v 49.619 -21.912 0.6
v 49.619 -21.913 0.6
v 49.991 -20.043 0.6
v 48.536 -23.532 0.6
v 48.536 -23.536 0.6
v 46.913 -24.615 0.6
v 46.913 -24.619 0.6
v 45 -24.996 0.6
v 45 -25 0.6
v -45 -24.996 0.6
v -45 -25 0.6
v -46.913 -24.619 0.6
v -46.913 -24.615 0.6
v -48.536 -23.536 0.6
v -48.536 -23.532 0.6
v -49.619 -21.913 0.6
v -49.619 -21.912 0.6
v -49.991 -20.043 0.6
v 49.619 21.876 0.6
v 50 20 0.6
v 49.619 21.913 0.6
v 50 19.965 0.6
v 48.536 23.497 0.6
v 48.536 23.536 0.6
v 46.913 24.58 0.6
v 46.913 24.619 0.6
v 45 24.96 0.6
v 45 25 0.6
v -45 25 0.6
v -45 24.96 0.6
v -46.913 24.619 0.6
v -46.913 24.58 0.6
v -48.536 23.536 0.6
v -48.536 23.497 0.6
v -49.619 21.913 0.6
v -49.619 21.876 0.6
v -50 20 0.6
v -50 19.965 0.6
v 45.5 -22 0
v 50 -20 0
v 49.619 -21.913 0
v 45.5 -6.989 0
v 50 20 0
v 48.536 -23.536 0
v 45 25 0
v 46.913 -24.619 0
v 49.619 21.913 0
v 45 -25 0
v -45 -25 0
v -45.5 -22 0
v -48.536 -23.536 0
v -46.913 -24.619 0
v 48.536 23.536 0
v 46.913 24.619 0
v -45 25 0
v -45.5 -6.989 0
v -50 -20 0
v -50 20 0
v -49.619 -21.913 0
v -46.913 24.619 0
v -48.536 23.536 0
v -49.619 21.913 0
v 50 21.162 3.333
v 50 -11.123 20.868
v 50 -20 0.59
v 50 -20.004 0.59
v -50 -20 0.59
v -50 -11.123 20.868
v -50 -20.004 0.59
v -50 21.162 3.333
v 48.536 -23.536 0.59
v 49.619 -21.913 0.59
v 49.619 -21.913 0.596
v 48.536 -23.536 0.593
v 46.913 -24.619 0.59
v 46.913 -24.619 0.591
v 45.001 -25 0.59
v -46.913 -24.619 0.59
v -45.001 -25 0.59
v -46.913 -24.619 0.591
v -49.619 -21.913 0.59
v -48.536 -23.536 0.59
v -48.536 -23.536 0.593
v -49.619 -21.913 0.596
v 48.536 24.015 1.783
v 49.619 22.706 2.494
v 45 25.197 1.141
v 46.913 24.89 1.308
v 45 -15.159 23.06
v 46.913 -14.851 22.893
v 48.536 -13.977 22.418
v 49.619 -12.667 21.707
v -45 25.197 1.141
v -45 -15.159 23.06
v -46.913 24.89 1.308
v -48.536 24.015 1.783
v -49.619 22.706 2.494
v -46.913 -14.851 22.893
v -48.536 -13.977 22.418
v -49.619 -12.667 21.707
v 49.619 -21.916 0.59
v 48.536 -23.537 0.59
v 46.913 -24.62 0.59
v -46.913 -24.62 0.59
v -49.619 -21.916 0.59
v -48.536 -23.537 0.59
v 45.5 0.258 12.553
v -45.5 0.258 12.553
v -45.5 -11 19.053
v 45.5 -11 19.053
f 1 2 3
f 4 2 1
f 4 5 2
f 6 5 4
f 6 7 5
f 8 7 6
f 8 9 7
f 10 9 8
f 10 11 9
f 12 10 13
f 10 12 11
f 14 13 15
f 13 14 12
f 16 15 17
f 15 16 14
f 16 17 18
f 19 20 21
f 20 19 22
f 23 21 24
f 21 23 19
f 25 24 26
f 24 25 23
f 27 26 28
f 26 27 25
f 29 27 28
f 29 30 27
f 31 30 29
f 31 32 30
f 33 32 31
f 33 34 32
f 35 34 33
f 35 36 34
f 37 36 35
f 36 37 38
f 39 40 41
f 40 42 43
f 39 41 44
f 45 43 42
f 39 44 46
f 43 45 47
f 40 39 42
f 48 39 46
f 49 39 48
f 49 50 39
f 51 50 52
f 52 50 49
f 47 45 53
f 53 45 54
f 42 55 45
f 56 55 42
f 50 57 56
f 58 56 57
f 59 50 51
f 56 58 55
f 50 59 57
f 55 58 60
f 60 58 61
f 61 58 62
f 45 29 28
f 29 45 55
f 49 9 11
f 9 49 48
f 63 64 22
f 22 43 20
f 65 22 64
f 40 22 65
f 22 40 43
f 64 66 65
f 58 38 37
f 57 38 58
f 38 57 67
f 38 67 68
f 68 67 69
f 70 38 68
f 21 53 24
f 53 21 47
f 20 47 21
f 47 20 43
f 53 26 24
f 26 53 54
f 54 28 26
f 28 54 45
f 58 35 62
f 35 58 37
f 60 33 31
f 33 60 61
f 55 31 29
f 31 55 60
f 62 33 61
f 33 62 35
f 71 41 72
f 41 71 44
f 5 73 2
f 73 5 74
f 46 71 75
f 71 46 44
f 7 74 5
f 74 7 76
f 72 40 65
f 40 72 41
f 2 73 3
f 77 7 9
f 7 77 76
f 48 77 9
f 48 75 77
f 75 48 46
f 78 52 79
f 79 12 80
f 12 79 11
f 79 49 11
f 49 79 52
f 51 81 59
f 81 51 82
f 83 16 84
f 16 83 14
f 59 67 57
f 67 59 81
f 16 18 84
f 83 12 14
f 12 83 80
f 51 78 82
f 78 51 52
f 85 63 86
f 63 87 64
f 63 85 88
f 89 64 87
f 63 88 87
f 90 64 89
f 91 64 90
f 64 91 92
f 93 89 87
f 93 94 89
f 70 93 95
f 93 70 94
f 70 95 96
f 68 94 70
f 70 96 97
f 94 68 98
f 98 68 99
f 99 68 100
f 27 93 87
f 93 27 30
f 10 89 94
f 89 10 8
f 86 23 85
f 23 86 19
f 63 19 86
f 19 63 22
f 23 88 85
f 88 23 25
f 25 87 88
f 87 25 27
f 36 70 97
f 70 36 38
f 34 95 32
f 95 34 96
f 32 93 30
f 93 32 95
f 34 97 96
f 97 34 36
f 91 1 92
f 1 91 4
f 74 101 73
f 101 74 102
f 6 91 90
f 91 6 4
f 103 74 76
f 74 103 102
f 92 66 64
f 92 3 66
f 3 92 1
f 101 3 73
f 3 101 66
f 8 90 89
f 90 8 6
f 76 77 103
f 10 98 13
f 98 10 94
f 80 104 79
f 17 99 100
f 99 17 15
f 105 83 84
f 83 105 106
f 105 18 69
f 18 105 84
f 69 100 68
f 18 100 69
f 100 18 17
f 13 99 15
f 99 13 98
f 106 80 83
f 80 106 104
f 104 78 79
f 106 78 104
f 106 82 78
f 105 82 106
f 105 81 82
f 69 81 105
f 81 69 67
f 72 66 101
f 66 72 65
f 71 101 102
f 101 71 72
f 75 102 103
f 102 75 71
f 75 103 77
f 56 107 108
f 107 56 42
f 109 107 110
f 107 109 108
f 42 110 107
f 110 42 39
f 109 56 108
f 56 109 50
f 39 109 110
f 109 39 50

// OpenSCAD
// preview[view:south, tilt:bottom]

/* [Global] */

// Load a 150x40 pixel image. This is the artwork for the logo. The background should be black and the logo white. If not, make sure to click the Invert Colors checkbox.
logo = "logo.dat"; // [image_surface:150x40]

// What Z height would you like to pause the printer to change the filament for the logo color (mm)?
z_height = 0.6;

/* [Hidden] */

holder_x = 100;
holder_y = 50;
holder_z = 25;
card_x = 91;
card_y = 13;
card_z = 22;
corner_radius = 5;
box_x = holder_x - (corner_radius * 2);
box_y = holder_y - (corner_radius * 2);
face_z = z_height;
offset_x = (holder_x / 2) - corner_radius;
offset_y = (holder_y / 2) - corner_radius;
logo_x = 90;
logo_y = 24;
scale_x = 150;
scale_y = 40;

difference() {
	translate([0, 0, face_z]) {
		translate([0, 0, -(face_z/2)]) {
			cube([box_x, holder_y, face_z], center=true);
			cube([holder_x, box_y, face_z], center=true);
			translate([ offset_x,  offset_y, 0]) cylinder(h=face_z, r=corner_radius, center=true);
			translate([-offset_x,  offset_y, 0]) cylinder(h=face_z, r=corner_radius, center=true);
			translate([ offset_x, -offset_y, 0]) cylinder(h=face_z, r=corner_radius, center=true);
			translate([-offset_x, -offset_y, 0]) cylinder(h=face_z, r=corner_radius, center=true);
		}
		translate([0, -holder_y / 2, -0.01]) scale([1, 0.898, 1]) rotate([-26, 0, 0]) difference() {
			translate([0, holder_y / 2, holder_z/2]) {
				cube([box_x, holder_y, holder_z], center=true);
				cube([holder_x, box_y, holder_z], center=true);
				translate([ offset_x,  offset_y, 0]) cylinder(h=holder_z, r=corner_radius, center=true);
				translate([-offset_x,  offset_y, 0]) cylinder(h=holder_z, r=corner_radius, center=true);
				translate([ offset_x, -offset_y, 0]) cylinder(h=holder_z, r=corner_radius, center=true);
				translate([-offset_x, -offset_y, 0]) cylinder(h=holder_z, r=corner_radius, center=true);
			}
			rotate([26, 0, 0]) translate([0, holder_y / 2, -holder_z/2]) cube([holder_x + 1, holder_y * 4/3, holder_z], center=true);
		}
	}
	translate([0, -holder_y/2+3, 0]) rotate([-30, 0, 0]) translate([0, card_y/2, 0]) cube([card_x, card_y, card_z*2], center=true);
	translate([0, (logo_y/2)-3, -0.01]) mirror([1,0,0]) rotate([0, 0, 180]) {
		scale([(logo_x)/scale_x, (logo_y)/scale_y, z_height]) surface(file=logo, center=true, convexity=5);
	}
}
